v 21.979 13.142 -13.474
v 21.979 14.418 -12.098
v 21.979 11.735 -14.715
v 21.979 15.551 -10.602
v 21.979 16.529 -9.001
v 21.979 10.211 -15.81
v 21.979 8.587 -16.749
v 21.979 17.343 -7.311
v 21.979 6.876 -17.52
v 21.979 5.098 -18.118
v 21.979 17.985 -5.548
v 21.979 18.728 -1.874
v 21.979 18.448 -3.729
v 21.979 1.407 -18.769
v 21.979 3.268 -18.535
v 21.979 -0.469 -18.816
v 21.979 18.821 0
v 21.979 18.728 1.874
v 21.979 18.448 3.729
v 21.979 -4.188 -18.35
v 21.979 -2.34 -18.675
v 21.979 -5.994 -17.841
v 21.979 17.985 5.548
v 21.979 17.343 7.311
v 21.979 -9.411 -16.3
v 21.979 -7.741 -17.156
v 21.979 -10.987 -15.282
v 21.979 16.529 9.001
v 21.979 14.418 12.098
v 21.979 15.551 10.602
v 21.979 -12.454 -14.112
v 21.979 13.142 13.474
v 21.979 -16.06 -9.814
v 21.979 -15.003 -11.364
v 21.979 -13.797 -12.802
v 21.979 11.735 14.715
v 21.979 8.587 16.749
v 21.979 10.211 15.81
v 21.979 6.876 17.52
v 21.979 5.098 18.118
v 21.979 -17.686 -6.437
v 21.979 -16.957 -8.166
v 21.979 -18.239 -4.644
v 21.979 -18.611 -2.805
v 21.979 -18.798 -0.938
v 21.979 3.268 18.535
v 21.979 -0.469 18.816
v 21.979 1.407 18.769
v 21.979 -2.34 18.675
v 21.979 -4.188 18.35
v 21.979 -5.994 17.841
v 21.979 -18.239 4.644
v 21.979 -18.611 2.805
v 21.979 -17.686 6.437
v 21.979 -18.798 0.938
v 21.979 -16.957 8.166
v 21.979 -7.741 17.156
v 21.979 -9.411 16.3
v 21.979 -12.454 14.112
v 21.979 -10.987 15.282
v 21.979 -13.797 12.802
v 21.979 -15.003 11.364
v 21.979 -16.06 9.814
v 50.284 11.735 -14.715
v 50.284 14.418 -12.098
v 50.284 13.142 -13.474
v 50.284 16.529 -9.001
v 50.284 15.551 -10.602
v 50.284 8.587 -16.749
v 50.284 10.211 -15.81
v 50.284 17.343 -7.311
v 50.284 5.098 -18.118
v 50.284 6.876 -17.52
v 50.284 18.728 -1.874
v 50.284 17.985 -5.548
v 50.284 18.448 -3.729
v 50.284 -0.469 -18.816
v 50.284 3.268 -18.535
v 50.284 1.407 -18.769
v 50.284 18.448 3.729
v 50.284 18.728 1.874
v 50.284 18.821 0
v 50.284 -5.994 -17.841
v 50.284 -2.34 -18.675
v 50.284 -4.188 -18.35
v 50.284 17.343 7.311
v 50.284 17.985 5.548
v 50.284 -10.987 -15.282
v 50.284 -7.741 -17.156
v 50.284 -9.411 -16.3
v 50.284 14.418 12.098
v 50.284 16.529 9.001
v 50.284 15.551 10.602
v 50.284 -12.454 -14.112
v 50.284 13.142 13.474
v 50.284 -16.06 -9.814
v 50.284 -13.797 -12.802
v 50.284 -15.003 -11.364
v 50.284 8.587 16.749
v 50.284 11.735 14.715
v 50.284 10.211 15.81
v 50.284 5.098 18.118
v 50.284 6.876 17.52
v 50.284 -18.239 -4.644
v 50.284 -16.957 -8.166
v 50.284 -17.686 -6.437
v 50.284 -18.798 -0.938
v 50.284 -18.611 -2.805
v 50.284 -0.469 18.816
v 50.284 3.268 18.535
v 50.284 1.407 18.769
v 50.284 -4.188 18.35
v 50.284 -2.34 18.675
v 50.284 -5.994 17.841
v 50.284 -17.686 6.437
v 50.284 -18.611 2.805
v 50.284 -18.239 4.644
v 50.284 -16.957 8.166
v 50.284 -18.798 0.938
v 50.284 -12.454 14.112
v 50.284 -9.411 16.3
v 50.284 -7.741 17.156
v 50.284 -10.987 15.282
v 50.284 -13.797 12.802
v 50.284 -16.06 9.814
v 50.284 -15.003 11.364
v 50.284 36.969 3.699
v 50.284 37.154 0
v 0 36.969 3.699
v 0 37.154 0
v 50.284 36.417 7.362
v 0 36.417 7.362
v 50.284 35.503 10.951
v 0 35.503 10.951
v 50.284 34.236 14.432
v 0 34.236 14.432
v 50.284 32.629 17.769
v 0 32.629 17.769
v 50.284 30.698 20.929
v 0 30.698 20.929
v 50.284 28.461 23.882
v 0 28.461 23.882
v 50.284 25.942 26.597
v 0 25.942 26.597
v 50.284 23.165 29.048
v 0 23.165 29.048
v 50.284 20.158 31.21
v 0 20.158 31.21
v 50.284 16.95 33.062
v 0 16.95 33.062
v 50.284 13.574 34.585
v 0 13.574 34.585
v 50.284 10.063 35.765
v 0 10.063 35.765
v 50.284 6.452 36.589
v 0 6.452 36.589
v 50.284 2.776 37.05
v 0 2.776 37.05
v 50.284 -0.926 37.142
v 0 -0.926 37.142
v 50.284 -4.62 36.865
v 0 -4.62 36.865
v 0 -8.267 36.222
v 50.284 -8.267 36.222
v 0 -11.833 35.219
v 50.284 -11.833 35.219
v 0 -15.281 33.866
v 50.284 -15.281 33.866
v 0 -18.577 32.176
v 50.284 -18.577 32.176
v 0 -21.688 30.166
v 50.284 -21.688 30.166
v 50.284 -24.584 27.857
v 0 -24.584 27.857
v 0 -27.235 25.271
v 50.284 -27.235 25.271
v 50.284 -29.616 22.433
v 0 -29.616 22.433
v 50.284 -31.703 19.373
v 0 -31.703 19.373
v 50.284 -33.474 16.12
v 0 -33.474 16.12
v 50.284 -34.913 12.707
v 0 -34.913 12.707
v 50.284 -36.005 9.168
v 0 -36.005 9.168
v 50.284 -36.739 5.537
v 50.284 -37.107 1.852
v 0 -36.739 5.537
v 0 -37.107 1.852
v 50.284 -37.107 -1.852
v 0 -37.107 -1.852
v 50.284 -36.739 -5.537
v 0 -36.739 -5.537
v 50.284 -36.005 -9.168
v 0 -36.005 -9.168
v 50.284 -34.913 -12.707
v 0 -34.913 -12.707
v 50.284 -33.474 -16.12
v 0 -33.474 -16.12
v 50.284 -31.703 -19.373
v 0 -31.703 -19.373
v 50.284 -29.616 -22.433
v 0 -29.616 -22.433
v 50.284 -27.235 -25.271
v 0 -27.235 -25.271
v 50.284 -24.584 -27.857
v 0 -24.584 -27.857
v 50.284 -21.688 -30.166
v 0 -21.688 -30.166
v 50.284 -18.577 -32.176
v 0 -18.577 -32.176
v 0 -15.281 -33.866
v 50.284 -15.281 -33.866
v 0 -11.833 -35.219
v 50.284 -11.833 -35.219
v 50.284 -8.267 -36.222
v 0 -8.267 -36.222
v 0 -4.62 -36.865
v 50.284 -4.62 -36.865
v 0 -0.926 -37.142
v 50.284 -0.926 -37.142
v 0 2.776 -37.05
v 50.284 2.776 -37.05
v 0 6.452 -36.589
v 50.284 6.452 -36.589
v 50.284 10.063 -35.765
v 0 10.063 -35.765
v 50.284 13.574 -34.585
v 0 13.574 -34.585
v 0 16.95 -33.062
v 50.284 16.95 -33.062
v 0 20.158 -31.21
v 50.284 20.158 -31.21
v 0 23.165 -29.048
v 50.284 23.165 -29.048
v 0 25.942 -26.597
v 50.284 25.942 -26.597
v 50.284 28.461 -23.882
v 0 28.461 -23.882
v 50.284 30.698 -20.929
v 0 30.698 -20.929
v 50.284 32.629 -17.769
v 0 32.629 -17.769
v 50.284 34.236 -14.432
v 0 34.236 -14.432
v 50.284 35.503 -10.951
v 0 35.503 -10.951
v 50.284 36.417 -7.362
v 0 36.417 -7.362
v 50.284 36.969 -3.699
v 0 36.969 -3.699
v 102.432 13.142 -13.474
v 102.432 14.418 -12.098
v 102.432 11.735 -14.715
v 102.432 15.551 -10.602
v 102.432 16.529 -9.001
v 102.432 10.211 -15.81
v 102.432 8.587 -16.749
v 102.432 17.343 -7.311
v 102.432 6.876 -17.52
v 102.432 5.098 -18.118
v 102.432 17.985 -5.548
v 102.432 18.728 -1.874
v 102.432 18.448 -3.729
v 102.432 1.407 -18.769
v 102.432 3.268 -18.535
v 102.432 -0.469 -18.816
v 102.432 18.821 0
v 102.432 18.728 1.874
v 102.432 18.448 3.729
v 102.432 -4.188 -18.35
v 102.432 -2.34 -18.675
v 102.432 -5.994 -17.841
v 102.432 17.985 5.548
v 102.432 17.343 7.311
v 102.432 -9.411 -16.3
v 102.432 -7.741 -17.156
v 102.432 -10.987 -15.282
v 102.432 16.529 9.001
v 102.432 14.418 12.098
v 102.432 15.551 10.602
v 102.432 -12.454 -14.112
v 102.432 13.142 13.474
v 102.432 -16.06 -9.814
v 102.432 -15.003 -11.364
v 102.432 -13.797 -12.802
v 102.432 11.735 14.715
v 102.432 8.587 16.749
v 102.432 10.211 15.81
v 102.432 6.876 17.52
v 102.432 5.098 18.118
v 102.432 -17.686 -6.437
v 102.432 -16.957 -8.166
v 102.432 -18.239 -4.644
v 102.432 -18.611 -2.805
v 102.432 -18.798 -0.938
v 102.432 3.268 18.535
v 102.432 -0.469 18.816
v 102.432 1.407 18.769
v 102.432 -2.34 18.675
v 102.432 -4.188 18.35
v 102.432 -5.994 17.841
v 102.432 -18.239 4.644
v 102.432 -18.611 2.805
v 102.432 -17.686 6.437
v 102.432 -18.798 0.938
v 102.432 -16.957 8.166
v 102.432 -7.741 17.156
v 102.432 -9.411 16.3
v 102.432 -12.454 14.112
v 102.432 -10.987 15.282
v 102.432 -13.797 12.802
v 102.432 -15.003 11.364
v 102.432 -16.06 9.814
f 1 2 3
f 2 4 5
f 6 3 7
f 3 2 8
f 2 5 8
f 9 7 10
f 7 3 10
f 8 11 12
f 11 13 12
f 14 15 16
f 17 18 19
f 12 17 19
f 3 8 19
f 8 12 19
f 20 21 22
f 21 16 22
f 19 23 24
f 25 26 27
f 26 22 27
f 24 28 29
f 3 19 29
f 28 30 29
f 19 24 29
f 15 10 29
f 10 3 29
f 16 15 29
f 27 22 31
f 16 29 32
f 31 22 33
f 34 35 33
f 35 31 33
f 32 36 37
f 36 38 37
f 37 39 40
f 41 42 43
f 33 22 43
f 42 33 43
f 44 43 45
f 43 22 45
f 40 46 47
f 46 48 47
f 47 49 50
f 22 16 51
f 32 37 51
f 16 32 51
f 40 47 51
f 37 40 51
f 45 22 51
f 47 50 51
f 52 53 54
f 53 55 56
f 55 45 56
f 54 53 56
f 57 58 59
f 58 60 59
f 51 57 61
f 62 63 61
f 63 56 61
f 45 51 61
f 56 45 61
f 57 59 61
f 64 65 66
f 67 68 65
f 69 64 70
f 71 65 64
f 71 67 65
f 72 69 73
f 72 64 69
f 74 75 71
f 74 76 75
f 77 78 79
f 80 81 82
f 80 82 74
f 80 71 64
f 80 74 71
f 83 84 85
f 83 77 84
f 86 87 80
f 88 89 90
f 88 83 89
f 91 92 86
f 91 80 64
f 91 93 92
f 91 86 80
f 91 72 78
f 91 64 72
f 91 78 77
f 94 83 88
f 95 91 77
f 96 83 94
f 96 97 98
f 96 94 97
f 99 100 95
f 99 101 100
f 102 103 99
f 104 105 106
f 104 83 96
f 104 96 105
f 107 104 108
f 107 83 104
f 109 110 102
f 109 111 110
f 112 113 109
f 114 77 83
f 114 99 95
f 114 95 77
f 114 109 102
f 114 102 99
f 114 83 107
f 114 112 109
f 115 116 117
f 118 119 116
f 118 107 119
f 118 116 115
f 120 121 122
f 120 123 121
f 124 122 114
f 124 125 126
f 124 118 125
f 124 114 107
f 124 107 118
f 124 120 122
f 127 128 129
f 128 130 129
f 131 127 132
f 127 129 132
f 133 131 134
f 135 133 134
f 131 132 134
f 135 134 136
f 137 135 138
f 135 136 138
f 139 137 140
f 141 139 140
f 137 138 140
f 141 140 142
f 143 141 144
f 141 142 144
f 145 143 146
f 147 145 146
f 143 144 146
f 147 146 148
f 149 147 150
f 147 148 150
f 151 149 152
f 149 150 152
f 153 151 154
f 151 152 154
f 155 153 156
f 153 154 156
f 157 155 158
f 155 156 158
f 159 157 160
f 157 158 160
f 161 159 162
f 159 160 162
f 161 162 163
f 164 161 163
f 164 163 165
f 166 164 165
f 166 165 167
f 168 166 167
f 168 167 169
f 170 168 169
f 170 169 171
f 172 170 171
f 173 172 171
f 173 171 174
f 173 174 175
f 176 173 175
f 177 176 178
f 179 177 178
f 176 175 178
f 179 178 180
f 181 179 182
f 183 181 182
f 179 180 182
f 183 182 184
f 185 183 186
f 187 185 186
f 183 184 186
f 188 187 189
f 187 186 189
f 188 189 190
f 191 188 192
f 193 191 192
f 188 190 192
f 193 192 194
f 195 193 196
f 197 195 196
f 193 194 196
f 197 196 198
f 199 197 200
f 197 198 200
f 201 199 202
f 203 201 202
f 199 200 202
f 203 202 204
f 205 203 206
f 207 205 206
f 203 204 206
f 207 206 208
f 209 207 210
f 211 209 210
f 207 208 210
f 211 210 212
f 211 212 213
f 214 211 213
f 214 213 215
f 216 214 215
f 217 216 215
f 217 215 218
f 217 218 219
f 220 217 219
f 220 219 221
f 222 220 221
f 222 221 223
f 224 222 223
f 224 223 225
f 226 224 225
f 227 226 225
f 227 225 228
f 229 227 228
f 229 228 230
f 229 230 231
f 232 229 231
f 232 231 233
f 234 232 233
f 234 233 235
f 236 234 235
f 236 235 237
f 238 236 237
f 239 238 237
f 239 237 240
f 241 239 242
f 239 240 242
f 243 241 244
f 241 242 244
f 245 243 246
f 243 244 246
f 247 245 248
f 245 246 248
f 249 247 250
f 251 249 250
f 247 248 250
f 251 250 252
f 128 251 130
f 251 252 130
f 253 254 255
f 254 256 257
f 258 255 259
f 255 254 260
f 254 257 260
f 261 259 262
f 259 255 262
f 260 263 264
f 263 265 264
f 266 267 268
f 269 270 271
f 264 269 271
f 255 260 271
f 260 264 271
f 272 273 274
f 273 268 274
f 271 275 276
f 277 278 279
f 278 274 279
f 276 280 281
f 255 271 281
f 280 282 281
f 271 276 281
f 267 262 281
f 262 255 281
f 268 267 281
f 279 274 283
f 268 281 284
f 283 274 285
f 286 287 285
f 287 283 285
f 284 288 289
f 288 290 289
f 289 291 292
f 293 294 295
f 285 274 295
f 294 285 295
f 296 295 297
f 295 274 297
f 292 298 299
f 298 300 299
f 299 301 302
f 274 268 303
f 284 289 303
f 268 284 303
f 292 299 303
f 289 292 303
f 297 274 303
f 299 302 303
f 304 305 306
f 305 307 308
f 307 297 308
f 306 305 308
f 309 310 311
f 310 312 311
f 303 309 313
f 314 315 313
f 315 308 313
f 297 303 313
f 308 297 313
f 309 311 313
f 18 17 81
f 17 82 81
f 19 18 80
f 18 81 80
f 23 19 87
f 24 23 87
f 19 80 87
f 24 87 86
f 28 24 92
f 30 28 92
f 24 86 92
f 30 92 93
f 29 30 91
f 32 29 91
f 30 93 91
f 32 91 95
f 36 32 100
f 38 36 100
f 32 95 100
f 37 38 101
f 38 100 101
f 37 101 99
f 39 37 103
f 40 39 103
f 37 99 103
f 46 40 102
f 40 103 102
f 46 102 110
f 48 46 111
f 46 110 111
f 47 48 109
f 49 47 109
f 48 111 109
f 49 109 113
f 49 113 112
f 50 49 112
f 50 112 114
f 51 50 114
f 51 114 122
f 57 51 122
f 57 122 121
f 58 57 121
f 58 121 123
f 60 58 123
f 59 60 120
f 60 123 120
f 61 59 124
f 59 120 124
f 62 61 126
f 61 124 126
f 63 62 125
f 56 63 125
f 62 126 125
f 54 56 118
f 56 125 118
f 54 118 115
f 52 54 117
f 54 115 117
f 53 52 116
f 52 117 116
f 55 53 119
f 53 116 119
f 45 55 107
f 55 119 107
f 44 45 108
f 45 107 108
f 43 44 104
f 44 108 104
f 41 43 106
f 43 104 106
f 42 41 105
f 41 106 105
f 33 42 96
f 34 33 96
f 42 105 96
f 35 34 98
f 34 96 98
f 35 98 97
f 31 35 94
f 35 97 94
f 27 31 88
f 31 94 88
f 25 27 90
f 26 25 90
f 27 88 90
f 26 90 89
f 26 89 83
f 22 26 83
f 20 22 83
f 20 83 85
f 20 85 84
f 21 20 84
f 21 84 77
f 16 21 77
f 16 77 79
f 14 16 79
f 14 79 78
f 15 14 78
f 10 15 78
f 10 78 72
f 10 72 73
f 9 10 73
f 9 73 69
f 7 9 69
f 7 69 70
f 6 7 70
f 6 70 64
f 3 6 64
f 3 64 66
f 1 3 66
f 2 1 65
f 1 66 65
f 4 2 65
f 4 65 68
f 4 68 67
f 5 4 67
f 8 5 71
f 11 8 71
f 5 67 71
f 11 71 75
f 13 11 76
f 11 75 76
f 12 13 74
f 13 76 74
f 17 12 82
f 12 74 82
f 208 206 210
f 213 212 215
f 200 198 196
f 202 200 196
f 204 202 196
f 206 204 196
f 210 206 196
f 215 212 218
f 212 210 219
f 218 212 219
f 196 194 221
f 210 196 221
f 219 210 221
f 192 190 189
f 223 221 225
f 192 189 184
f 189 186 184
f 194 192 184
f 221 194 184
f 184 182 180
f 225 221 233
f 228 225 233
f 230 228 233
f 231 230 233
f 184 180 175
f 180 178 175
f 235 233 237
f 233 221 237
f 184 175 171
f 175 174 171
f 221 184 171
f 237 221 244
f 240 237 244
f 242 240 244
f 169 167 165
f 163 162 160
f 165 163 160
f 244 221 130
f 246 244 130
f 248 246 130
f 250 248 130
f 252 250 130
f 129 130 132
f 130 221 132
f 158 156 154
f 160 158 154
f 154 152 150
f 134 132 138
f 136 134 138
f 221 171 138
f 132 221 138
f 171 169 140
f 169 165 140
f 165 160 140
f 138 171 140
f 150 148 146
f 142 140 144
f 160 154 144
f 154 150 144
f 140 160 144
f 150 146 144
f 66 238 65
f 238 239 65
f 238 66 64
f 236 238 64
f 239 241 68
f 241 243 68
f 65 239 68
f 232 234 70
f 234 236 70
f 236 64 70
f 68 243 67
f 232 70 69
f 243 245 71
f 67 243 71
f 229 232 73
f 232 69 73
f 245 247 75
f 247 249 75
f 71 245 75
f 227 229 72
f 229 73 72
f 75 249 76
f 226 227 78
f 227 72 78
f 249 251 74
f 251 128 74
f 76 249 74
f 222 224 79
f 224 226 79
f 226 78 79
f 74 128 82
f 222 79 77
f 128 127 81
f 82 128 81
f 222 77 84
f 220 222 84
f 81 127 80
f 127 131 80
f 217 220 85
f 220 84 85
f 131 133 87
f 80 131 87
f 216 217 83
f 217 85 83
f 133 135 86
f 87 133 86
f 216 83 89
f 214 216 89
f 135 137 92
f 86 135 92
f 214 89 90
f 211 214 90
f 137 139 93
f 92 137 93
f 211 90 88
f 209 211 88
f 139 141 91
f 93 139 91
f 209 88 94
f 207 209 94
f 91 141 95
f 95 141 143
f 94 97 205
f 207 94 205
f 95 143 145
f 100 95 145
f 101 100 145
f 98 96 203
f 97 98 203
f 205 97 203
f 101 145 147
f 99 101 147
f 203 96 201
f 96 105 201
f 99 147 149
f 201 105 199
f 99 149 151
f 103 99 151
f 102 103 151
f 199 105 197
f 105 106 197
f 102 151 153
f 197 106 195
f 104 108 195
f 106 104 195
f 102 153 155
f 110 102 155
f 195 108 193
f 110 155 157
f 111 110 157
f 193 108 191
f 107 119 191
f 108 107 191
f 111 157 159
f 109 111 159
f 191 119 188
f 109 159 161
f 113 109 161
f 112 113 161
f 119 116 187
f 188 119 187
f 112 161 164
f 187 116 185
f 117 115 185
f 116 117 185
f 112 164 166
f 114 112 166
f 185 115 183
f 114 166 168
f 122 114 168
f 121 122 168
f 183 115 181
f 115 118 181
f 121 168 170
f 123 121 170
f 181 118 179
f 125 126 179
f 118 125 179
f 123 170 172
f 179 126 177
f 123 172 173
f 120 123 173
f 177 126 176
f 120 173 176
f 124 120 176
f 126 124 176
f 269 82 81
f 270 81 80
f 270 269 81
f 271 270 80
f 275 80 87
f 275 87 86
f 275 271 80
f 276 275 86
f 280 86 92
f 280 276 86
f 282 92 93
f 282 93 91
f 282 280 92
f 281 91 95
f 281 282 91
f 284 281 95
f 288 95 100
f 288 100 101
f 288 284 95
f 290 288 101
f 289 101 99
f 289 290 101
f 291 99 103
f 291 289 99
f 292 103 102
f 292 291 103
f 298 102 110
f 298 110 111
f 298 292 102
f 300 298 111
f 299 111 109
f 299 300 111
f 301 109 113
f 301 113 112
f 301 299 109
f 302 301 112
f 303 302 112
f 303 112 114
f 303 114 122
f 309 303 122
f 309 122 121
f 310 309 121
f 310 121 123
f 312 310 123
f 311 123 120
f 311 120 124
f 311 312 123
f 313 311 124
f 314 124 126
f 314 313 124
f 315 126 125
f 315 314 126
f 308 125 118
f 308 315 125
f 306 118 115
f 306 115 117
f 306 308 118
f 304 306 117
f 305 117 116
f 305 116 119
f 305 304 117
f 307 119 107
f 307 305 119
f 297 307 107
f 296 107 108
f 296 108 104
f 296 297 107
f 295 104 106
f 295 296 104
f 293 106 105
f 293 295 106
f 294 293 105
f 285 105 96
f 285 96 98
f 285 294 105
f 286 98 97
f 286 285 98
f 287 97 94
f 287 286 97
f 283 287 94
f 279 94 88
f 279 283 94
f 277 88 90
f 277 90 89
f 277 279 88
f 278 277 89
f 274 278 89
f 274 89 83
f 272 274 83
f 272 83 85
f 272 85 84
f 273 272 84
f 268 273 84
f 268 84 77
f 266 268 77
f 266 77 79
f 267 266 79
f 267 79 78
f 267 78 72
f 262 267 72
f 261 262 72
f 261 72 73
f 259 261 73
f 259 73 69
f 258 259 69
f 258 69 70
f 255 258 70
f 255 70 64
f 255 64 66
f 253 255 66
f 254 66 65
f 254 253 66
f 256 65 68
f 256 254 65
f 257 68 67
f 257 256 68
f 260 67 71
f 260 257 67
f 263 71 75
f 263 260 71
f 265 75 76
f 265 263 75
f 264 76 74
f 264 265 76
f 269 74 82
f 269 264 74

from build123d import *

# Parameters (mm, degrees)
F0_W = 52.148483
F0_H = 18.8214


with BuildPart() as f1:
    # F0 (on Top) → F1 (revolve)
    with BuildSketch(Plane.XY):
        Polygon((0, 37.15352), (0, 0), (21.979444, 0), (21.979444, 18.8214), (50.283954, 18.8214), (50.283954, 37.15352), align=None)
    revolve(axis=Axis((25.141977, 0, 0), (1, 0, 0)))


with BuildPart() as f2:
    # F0 (on Top) → F2 (revolve)
    with BuildSketch(Plane.XY):
        with Locations((76.358195, 9.4107)):
            Rectangle(F0_W, F0_H)
    revolve(axis=Axis((76.358195, 0, 0), (1, 0, 0)))


solid = Compound([f1.part, f2.part])
